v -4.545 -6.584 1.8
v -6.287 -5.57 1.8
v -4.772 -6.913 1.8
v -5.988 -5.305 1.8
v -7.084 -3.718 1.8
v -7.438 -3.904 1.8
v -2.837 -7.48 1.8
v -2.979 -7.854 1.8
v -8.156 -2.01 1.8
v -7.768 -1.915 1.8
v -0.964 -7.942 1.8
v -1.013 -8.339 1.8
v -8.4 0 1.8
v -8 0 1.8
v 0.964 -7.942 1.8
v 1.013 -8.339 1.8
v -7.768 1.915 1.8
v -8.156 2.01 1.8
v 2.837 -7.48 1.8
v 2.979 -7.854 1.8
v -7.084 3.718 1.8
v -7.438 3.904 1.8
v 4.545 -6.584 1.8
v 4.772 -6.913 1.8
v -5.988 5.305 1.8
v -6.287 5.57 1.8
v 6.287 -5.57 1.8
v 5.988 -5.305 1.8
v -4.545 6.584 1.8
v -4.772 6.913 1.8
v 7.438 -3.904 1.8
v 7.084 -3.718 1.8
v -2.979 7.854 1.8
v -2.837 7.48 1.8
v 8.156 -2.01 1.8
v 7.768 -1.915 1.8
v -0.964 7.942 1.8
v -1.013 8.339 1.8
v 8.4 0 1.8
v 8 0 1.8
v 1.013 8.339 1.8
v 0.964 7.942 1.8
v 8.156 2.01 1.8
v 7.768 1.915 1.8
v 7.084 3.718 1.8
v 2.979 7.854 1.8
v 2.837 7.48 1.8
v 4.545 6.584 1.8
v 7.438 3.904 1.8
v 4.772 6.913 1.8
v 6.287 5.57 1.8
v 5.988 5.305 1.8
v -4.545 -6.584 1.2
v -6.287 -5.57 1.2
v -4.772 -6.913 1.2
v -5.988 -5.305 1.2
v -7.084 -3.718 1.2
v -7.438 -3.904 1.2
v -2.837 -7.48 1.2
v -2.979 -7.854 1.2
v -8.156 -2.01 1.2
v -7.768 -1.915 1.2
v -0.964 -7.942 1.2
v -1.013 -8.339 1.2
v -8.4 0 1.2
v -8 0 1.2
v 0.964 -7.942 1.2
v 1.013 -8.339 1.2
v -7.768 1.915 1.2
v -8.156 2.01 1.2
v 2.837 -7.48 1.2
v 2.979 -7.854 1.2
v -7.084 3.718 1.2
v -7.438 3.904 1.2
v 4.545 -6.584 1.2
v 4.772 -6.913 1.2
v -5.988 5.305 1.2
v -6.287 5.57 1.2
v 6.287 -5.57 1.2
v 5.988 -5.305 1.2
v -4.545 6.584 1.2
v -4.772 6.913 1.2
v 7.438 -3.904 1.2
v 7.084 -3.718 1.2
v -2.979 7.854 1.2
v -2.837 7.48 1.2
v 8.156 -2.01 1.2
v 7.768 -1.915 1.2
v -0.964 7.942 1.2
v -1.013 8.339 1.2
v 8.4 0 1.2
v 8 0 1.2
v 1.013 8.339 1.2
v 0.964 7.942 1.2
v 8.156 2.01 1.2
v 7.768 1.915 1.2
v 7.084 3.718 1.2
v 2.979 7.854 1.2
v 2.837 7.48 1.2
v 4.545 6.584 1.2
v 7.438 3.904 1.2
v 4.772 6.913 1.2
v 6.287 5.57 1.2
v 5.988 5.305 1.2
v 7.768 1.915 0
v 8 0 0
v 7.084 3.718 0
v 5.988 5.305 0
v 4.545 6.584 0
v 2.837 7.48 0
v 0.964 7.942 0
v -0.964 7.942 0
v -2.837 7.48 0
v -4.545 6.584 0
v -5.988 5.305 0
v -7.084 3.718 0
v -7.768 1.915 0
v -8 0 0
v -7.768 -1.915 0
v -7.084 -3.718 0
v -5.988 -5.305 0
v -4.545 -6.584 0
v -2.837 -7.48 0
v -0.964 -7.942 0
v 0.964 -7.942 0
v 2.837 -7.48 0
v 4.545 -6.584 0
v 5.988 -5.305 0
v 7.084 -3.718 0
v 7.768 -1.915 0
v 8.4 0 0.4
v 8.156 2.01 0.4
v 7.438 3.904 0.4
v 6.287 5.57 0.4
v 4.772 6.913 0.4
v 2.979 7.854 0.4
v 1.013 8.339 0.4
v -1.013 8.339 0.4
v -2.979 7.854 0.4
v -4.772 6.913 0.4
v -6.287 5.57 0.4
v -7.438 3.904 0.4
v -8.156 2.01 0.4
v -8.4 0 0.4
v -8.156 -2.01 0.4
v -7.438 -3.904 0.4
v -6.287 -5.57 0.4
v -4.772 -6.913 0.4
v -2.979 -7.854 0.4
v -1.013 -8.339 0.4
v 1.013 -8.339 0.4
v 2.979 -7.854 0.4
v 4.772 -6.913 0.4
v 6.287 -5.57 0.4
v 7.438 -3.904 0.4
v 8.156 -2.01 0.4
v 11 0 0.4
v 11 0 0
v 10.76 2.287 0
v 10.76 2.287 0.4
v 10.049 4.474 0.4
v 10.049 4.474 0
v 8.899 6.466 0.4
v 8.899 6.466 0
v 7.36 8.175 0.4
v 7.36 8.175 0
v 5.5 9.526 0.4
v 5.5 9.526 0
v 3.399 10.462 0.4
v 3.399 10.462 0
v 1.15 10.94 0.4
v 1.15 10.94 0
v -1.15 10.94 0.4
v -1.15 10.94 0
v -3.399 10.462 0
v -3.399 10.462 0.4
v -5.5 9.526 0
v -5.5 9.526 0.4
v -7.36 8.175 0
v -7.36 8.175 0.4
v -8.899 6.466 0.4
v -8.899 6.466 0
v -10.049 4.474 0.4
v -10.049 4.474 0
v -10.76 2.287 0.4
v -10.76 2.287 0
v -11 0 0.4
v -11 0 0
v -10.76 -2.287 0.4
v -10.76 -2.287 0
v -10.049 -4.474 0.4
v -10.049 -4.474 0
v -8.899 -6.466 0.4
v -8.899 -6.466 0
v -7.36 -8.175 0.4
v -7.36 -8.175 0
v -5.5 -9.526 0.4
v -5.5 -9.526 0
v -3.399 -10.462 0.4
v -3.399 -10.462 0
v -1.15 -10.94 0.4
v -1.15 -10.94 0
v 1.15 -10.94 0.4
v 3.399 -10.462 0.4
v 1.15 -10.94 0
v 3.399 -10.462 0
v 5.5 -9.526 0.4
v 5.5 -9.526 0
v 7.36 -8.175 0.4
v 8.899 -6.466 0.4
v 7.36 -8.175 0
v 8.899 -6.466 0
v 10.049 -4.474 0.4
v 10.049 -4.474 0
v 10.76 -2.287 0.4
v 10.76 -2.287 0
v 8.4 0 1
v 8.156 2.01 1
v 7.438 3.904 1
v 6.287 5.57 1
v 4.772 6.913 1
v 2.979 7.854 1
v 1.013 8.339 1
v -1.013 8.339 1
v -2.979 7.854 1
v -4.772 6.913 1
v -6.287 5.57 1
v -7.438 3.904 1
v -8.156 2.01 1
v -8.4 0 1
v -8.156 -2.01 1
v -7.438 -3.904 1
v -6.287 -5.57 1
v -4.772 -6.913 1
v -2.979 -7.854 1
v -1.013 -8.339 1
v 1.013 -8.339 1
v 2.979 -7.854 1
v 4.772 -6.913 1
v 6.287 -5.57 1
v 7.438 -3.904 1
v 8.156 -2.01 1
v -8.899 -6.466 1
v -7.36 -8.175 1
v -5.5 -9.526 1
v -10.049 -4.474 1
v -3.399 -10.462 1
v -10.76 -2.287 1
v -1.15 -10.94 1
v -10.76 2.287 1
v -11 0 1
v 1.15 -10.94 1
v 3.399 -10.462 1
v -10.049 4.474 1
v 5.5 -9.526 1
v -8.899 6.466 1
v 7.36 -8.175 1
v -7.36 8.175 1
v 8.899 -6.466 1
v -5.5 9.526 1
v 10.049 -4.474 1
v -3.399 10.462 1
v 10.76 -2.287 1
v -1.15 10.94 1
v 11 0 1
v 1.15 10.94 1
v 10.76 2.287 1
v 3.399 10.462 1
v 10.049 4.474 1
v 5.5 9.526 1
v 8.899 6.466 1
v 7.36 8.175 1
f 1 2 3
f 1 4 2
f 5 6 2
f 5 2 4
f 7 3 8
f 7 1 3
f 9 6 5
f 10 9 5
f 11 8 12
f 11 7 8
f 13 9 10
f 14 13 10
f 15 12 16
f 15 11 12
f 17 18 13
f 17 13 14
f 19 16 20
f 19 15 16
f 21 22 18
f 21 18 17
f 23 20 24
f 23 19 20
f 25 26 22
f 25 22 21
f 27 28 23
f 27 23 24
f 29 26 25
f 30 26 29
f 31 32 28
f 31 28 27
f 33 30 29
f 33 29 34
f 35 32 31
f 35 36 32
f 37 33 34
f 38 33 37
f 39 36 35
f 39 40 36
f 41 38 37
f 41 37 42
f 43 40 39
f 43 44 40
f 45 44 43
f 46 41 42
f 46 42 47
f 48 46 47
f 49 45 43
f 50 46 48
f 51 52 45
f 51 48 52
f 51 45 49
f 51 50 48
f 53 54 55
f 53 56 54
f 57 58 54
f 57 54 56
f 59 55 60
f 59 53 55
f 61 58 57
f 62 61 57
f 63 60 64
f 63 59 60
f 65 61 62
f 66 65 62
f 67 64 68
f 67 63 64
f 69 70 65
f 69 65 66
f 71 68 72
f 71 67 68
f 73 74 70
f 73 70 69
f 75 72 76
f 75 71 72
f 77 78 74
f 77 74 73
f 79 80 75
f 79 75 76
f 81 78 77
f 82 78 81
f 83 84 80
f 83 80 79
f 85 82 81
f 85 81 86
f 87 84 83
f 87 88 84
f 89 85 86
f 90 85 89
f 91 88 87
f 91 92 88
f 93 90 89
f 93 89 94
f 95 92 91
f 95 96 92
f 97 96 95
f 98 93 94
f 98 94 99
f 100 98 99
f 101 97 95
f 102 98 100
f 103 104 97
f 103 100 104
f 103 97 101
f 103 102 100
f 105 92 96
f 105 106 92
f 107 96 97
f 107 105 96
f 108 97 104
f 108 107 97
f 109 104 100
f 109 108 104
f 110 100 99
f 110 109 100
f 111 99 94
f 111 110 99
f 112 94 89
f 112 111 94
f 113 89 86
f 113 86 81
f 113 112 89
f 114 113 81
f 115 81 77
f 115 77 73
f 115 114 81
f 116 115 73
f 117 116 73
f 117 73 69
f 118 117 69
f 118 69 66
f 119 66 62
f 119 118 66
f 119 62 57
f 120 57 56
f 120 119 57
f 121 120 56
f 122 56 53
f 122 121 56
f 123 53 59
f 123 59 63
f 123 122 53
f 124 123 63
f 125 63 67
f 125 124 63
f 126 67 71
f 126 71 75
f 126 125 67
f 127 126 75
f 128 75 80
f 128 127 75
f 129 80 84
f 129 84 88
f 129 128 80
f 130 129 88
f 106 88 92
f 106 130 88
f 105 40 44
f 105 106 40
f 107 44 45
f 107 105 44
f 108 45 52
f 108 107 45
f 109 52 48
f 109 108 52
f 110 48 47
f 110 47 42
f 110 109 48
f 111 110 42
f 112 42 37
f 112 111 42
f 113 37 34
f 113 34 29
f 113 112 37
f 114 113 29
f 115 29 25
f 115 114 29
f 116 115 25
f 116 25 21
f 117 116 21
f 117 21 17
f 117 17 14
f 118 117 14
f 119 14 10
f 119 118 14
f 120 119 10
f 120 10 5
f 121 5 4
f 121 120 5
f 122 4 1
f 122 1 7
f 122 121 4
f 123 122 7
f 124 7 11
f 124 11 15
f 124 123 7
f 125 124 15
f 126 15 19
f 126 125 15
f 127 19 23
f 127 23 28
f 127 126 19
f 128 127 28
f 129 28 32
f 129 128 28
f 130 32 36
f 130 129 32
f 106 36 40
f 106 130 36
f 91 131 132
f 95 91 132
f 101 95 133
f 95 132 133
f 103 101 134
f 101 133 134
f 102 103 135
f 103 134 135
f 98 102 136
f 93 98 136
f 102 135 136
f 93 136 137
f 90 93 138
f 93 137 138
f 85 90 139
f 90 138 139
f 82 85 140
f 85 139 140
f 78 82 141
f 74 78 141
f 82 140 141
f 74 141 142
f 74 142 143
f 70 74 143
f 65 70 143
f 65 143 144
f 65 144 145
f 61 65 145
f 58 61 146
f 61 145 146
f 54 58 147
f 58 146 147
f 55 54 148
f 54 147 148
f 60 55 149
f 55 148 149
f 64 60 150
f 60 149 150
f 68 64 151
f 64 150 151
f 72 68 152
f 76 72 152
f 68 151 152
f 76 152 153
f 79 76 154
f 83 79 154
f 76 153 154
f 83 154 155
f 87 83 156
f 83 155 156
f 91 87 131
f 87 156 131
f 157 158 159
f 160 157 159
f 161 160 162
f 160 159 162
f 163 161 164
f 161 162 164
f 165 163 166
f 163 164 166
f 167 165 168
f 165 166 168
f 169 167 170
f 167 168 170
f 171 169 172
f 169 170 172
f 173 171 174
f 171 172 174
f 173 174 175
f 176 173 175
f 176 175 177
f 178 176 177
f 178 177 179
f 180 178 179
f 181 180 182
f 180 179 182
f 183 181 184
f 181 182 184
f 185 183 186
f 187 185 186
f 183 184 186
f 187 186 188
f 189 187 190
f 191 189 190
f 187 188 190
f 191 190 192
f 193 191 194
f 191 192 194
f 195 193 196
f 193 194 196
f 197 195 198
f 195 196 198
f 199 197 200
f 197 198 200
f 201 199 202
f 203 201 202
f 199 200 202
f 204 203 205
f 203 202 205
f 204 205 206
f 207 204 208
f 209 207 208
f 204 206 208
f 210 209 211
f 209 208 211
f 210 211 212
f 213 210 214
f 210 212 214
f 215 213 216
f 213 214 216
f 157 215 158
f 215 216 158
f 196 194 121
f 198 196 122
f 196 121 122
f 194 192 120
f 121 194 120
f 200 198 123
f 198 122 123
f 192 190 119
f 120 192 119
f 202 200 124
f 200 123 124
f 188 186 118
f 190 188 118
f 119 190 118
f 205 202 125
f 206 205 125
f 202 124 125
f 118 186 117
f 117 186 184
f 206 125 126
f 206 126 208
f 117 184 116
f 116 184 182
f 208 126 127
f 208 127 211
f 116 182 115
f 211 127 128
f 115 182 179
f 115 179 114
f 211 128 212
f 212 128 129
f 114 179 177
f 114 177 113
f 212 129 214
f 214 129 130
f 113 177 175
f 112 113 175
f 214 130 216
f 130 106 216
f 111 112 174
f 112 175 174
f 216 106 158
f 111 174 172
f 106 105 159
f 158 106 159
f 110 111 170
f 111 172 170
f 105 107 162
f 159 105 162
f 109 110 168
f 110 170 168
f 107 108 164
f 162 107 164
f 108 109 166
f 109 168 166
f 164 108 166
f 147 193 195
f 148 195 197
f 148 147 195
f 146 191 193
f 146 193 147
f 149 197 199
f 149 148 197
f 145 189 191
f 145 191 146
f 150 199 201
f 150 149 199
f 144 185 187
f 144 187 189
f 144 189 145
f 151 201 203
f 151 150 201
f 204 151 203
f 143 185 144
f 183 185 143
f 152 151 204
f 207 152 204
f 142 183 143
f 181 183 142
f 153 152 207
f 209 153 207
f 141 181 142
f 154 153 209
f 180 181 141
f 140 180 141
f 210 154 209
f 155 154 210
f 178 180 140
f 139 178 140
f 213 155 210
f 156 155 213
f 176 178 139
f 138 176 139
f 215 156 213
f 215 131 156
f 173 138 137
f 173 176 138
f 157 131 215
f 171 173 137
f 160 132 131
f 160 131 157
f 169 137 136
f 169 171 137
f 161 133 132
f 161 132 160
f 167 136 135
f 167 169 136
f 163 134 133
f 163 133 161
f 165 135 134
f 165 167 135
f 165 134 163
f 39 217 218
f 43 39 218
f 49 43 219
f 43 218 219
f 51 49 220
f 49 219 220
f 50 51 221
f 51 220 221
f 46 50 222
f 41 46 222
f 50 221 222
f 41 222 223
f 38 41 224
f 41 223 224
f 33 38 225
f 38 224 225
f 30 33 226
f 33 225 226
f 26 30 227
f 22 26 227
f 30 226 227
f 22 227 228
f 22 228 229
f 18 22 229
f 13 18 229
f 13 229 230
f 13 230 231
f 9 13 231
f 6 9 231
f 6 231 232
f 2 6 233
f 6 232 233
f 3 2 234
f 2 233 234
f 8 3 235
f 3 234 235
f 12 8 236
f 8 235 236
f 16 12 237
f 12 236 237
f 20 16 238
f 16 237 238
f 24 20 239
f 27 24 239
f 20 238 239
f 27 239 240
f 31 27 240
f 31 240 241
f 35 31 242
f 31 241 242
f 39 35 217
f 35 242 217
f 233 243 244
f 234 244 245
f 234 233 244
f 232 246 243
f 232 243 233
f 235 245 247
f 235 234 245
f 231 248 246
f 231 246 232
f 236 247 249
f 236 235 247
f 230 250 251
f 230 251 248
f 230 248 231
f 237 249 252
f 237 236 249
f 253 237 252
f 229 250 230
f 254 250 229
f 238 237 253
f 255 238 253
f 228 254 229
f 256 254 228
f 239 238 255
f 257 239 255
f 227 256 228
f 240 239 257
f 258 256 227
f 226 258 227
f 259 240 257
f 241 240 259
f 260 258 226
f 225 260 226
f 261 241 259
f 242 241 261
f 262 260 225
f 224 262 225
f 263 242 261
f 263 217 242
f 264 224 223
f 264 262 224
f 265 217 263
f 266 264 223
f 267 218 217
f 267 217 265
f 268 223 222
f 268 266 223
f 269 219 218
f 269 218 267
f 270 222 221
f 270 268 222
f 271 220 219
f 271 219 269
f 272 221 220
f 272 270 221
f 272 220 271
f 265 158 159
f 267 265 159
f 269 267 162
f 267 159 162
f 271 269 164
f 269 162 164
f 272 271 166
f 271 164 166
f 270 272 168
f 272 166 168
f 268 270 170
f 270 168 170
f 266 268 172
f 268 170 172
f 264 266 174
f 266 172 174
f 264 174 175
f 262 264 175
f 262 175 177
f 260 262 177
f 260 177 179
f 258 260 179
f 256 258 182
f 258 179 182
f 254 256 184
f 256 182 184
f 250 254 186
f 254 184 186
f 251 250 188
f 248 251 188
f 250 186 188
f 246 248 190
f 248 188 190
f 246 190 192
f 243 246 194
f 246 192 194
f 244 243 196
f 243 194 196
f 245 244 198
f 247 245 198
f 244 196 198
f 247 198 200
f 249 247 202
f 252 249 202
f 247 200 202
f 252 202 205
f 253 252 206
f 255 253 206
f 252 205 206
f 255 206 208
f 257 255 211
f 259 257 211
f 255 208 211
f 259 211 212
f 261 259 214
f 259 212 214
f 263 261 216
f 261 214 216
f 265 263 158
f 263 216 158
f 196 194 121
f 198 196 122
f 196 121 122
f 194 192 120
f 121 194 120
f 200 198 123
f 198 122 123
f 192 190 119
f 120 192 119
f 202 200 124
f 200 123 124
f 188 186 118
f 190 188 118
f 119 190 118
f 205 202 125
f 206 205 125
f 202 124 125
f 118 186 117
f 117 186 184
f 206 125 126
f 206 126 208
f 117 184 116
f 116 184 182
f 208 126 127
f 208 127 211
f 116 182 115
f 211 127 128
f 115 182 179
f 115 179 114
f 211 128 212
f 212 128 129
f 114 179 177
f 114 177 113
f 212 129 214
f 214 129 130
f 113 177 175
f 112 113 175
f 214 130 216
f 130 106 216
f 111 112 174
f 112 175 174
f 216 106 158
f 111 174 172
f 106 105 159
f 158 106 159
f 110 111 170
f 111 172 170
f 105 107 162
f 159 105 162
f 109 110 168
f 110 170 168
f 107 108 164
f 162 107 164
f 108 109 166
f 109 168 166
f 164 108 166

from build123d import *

# Parameters (mm, degrees)
SKETCH_R      = 11
SKETCH_R_2    = 8
PAD_DEPTH     = 1
SKETCH001_R   = 8.4
SKETCH001_R_2 = 8
PAD001_DEPTH  = 0.8
SKETCH002_R   = 11
SKETCH002_R_2 = 8
PAD002_DEPTH  = 0.4
SKETCH003_R   = 8.4
SKETCH003_R_2 = 8
PAD003_DEPTH  = 0.8


with BuildPart() as switchinsulatorbody:
    # Sketch → Pad (new body)
    with BuildSketch(Plane.XY):
        Circle(SKETCH_R)
        Circle(SKETCH_R_2, mode=Mode.SUBTRACT)
    extrude(amount=PAD_DEPTH)

    # Sketch001 (on Face4 of Pad) → Pad001 (join)
    with BuildSketch(Plane.XY.offset(1)):
        Circle(SKETCH001_R)
        Circle(SKETCH001_R_2, mode=Mode.SUBTRACT)
    extrude(amount=PAD001_DEPTH)


with BuildPart() as switchinsulatorbody001:
    # Sketch002 → Pad002 (new body)
    with BuildSketch(Plane.XY):
        Circle(SKETCH002_R)
        Circle(SKETCH002_R_2, mode=Mode.SUBTRACT)
    extrude(amount=PAD002_DEPTH)

    # Sketch003 (on Face4 of Pad002) → Pad003 (join)
    with BuildSketch(Plane.XY.offset(0.4)):
        Circle(SKETCH003_R)
        Circle(SKETCH003_R_2, mode=Mode.SUBTRACT)
    extrude(amount=PAD003_DEPTH)


solid = Compound([switchinsulatorbody.part, switchinsulatorbody001.part])
